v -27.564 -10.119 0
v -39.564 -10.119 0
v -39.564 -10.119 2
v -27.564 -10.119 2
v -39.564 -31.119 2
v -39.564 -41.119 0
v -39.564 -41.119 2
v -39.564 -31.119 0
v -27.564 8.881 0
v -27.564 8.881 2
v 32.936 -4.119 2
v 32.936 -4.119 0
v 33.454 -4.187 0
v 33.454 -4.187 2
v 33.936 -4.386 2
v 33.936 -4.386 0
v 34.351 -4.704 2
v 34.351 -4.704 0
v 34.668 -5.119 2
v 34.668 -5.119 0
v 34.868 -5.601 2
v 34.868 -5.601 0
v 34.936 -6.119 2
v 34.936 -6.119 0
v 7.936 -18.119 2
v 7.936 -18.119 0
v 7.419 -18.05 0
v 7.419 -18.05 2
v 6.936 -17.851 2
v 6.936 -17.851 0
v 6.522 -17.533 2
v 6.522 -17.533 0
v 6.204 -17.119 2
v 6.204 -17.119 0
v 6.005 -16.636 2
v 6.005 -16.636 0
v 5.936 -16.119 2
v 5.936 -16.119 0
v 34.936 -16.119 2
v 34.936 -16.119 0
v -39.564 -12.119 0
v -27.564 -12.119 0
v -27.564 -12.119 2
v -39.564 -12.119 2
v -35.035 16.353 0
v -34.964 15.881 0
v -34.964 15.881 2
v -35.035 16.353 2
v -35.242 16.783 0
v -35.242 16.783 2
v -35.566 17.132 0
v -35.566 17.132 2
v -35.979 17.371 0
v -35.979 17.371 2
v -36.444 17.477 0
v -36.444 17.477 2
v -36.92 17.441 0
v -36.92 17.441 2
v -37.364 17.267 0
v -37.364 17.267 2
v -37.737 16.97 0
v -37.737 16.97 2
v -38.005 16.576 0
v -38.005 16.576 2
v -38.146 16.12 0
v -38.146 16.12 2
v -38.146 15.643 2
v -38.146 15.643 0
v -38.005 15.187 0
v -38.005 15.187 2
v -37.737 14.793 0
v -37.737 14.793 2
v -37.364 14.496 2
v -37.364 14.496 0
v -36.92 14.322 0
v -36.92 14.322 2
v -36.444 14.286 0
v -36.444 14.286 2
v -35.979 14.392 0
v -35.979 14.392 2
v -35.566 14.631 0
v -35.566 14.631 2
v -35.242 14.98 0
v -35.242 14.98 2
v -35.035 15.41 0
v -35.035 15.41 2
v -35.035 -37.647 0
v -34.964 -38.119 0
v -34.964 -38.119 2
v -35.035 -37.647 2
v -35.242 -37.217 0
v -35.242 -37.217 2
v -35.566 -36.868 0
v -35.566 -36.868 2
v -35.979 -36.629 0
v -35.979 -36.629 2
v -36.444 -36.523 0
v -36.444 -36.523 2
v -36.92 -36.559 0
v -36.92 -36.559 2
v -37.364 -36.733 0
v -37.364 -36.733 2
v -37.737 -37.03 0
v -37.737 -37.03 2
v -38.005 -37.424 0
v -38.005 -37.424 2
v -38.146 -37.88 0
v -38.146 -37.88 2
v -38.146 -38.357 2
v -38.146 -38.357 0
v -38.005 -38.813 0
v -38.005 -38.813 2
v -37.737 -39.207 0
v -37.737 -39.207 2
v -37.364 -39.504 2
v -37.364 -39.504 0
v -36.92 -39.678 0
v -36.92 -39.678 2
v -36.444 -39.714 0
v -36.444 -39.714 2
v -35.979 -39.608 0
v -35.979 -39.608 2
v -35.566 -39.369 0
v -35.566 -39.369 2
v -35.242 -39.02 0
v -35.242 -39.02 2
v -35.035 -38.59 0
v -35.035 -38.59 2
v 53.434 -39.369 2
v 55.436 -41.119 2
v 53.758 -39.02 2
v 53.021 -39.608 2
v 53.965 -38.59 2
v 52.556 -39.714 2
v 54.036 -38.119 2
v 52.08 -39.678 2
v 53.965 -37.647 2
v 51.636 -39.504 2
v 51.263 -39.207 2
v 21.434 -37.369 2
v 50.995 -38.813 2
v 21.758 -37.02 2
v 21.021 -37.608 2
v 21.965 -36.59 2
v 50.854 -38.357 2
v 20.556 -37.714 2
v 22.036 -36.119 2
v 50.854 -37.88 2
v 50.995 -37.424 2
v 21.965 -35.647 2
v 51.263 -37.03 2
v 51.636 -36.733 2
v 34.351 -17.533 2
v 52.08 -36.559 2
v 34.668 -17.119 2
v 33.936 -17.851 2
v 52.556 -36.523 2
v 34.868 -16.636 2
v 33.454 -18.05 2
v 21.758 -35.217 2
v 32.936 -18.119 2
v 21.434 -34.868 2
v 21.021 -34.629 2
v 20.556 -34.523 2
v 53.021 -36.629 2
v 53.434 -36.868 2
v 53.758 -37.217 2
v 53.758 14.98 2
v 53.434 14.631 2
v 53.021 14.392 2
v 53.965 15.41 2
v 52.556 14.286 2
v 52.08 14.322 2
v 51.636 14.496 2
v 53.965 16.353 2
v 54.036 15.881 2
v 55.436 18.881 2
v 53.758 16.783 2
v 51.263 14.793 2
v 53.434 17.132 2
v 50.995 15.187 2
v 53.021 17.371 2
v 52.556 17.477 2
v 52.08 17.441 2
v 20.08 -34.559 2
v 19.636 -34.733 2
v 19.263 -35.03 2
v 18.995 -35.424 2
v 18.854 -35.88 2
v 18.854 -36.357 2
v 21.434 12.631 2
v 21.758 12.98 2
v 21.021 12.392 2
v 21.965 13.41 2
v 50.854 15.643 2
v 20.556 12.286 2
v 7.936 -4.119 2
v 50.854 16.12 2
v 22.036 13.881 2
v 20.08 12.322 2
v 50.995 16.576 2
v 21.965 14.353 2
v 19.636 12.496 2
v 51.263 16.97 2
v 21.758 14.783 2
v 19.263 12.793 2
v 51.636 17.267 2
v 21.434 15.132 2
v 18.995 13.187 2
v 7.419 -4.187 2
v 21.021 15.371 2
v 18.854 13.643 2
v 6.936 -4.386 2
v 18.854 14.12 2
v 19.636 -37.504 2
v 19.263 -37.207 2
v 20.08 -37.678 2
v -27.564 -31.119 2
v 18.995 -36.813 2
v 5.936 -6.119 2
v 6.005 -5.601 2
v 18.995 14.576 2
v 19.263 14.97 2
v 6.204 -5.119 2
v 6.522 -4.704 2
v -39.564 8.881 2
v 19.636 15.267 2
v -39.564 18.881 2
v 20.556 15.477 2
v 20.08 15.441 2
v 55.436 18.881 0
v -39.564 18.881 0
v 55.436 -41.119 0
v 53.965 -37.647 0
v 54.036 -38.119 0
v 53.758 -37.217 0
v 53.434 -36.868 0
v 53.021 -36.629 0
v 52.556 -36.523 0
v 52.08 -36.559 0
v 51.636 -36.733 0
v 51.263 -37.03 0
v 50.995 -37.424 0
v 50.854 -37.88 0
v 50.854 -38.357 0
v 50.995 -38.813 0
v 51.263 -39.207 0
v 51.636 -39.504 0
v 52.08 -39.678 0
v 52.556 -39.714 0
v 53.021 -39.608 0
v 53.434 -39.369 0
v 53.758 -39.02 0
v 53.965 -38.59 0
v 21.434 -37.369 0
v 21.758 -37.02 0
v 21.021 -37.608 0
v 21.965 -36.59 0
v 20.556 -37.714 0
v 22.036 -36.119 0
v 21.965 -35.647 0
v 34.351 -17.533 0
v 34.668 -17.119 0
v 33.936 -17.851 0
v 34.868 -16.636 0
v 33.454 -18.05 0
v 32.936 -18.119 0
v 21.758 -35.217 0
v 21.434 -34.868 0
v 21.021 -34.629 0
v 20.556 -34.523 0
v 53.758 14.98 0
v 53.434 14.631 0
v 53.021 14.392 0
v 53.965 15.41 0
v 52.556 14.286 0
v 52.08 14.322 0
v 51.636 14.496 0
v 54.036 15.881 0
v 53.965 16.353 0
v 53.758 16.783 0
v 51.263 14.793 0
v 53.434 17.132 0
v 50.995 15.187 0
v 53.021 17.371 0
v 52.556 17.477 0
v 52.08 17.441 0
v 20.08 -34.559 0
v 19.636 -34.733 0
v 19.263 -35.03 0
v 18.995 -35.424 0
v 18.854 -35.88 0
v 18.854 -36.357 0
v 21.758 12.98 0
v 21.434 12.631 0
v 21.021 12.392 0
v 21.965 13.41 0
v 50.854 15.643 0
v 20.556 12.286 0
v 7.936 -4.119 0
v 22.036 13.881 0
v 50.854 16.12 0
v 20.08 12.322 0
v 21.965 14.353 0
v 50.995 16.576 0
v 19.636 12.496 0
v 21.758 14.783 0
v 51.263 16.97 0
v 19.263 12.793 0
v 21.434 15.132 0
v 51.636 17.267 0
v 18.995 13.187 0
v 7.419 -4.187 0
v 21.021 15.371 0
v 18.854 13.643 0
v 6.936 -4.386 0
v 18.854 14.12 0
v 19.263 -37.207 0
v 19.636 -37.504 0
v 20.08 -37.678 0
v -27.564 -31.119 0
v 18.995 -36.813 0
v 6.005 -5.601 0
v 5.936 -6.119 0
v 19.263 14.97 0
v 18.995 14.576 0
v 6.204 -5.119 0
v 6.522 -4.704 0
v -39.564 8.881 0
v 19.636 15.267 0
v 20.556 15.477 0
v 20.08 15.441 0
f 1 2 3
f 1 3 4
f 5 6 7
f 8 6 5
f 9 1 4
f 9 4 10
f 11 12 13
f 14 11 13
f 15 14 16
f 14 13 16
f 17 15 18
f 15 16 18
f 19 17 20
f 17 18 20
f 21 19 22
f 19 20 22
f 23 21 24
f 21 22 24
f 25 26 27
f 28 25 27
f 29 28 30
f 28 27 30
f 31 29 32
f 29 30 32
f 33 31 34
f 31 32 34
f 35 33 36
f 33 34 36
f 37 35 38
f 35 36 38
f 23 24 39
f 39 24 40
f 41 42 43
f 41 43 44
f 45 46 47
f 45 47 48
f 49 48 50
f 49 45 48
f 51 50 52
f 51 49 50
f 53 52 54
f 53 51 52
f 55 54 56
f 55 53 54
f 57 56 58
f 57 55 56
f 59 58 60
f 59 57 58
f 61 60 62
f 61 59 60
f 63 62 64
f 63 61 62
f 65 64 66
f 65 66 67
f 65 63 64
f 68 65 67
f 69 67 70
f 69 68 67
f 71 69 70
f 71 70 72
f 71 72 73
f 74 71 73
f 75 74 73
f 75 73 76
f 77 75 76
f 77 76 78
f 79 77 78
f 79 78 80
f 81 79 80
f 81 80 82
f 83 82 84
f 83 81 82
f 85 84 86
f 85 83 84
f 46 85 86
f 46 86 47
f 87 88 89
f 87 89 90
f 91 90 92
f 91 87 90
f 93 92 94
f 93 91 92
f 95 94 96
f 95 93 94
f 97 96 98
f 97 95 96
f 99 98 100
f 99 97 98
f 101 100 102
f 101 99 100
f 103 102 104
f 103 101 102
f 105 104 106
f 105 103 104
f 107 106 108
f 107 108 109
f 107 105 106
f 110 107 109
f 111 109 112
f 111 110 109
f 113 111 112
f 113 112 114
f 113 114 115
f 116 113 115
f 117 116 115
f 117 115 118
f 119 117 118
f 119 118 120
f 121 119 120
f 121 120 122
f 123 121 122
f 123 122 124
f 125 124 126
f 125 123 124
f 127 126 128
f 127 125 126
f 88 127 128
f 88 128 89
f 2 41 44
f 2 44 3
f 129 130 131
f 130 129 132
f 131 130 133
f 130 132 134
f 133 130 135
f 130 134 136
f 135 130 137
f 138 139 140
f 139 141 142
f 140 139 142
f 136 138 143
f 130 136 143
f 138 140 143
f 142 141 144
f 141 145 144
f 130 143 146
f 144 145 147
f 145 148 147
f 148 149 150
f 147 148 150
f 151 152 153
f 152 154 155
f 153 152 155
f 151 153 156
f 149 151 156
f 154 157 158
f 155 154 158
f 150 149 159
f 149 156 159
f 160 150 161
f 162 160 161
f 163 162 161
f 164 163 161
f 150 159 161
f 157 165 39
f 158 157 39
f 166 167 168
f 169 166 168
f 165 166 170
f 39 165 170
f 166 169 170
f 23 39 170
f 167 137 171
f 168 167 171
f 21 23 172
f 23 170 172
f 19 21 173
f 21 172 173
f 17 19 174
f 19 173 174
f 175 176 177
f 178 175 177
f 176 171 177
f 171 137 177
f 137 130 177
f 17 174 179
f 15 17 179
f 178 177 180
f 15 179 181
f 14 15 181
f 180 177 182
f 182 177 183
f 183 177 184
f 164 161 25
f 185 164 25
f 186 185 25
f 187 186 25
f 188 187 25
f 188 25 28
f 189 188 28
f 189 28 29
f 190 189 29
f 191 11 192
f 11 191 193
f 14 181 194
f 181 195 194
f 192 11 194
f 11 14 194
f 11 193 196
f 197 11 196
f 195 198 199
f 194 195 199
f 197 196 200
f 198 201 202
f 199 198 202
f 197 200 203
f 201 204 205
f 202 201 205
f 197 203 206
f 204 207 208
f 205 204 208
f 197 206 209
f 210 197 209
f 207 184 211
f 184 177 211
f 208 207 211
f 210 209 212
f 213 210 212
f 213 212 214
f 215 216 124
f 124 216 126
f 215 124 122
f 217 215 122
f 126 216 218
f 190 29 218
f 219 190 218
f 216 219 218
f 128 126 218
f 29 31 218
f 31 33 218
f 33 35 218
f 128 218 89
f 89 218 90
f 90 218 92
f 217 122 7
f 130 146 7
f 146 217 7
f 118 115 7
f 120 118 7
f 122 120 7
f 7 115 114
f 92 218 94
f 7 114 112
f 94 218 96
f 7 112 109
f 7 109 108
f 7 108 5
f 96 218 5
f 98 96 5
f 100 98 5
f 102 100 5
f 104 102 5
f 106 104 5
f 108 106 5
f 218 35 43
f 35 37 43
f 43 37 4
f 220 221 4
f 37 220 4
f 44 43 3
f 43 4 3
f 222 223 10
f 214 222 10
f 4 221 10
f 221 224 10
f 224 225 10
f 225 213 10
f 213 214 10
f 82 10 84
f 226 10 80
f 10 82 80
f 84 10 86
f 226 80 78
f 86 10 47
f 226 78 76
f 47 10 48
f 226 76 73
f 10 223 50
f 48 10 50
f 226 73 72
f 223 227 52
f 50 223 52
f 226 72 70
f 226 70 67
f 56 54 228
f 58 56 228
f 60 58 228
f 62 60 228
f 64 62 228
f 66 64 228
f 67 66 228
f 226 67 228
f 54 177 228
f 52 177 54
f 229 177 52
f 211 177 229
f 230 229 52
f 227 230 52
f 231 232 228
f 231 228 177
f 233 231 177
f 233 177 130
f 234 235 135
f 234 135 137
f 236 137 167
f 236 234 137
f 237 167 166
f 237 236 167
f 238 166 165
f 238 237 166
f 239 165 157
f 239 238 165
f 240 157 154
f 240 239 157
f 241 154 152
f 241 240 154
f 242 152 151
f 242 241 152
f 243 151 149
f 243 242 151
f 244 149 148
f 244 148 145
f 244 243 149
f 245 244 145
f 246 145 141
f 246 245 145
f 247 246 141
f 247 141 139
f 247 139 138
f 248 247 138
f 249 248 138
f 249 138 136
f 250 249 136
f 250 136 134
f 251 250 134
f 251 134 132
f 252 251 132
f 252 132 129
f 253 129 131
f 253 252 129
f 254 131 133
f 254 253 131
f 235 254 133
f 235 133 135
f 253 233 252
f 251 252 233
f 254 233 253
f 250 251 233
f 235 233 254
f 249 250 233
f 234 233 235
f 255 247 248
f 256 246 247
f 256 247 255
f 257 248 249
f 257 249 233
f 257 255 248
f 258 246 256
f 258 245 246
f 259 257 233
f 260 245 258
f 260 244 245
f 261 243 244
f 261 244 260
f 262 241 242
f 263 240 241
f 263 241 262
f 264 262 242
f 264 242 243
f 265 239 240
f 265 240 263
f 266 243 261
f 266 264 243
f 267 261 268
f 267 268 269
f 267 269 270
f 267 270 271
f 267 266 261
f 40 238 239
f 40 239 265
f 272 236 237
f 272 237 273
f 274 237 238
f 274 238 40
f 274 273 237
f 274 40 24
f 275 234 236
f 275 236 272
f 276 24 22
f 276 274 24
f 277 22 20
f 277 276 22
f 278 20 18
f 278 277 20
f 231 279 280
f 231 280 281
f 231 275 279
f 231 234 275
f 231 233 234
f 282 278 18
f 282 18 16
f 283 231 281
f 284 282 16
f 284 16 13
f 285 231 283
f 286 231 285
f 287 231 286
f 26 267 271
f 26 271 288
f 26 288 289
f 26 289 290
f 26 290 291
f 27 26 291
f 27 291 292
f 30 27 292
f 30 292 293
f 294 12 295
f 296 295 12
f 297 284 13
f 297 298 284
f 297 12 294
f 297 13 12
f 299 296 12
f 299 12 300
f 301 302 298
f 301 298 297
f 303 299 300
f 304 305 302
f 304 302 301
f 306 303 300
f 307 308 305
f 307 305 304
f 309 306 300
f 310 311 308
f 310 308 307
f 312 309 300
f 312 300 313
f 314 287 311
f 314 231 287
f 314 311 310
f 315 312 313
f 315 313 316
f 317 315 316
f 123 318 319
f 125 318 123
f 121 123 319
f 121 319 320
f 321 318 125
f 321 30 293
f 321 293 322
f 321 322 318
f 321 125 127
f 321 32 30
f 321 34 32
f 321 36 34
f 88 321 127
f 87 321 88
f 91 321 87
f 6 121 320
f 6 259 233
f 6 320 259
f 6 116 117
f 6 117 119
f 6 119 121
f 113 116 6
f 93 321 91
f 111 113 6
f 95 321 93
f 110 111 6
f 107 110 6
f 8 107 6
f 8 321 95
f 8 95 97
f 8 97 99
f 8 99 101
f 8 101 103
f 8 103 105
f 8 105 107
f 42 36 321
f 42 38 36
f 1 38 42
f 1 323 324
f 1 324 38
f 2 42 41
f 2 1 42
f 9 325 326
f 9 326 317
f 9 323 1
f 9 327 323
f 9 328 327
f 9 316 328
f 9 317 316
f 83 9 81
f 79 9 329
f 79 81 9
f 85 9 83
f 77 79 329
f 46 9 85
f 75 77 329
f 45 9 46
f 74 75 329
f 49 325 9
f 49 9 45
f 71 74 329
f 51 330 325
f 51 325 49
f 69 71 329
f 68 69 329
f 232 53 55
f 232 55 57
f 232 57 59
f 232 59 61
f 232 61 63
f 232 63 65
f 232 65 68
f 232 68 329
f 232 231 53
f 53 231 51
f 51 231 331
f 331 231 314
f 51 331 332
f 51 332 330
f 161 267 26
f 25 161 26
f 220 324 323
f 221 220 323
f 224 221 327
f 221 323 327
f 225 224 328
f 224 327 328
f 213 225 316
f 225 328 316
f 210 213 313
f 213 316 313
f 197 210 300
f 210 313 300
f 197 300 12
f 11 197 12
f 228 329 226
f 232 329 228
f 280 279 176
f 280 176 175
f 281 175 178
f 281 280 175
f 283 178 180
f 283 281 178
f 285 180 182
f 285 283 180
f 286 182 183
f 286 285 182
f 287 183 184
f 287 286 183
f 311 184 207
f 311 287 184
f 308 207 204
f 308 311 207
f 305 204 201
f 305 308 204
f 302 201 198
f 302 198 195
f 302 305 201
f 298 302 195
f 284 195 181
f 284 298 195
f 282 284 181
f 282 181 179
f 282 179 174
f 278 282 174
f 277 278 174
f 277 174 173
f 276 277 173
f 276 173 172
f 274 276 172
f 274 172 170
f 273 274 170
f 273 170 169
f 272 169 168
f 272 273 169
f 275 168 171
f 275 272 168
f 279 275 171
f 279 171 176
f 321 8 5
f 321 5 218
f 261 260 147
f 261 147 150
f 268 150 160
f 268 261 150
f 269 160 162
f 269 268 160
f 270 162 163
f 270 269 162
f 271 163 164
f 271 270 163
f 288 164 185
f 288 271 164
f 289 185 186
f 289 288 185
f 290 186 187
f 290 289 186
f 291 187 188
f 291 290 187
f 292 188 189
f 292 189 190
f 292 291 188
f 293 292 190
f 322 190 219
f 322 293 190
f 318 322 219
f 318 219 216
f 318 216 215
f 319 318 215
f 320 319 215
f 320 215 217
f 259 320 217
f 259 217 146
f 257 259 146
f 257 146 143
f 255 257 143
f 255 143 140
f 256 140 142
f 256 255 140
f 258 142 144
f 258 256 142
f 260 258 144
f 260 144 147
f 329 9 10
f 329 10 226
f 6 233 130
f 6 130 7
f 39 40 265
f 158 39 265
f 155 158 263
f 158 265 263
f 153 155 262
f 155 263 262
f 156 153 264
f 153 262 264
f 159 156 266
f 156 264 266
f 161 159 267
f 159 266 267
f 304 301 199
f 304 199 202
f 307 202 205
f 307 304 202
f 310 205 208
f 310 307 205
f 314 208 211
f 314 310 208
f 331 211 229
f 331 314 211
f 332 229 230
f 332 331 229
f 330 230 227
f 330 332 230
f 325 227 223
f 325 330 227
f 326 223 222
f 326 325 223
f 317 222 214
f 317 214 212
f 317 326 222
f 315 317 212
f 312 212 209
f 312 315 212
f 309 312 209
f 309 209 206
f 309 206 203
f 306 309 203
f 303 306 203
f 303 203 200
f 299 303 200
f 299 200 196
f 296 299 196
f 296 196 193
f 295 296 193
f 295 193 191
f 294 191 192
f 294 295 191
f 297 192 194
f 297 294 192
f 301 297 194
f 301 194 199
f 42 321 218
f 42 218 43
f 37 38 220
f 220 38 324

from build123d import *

# Parameters (mm, degrees)
SKETCH1_R           = 1.6
BOSS_EXTRUDE1_DEPTH = 2


with BuildPart() as part:
    # Sketch1 → Boss-Extrude1 (new body)
    with BuildSketch(Plane.XY):
        Polygon((-39.5636369, 18.881491211), (55.4363631, 18.881491211), (55.4363631, -41.118508789), (-39.5636369, -41.118508789), (-39.5636369, -31.118508789), (-27.5636369, -31.118508789), (-27.5636369, -12.118508789), (-39.5636369, -12.118508789), (-39.5636369, -10.118508789), (-27.5636369, -10.118508789), (-27.5636369, 8.881491211), (-39.5636369, 8.881491211), align=None)
        with Locations((20.4363631, 13.881491211)):
            Circle(SKETCH1_R, mode=Mode.SUBTRACT)
        with Locations((20.4363631, -36.118508789)):
            Circle(SKETCH1_R, mode=Mode.SUBTRACT)
        with Locations((-36.5636369, 15.881491211)):
            Circle(SKETCH1_R, mode=Mode.SUBTRACT)
        with Locations((52.4363631, 15.881491211)):
            Circle(SKETCH1_R, mode=Mode.SUBTRACT)
        with Locations((-36.5636369, -38.118508789)):
            Circle(SKETCH1_R, mode=Mode.SUBTRACT)
        with Locations((52.4363631, -38.118508789)):
            Circle(SKETCH1_R, mode=Mode.SUBTRACT)
        with BuildLine():
            Line((7.9363631, -4.118508789), (32.9363631, -4.118508789))
            ThreePointArc((32.9363631, -4.118508789), (34.350576663, -4.704295227), (34.9363631, -6.118508789))
            Line((34.9363631, -6.118508789), (34.9363631, -16.118508789))
            ThreePointArc((34.9363631, -16.118508789), (34.350576663, -17.532722351), (32.9363631, -18.118508789))
            Line((32.9363631, -18.118508789), (7.9363631, -18.118508789))
            ThreePointArc((7.9363631, -18.118508789), (6.522149538, -17.532722351), (5.9363631, -16.118508789))
            Line((5.9363631, -16.118508789), (5.9363631, -6.118508789))
            ThreePointArc((5.9363631, -6.118508789), (6.522149538, -4.704295227), (7.9363631, -4.118508789))
        make_face(mode=Mode.SUBTRACT)
    extrude(amount=BOSS_EXTRUDE1_DEPTH)


solid = part.part
